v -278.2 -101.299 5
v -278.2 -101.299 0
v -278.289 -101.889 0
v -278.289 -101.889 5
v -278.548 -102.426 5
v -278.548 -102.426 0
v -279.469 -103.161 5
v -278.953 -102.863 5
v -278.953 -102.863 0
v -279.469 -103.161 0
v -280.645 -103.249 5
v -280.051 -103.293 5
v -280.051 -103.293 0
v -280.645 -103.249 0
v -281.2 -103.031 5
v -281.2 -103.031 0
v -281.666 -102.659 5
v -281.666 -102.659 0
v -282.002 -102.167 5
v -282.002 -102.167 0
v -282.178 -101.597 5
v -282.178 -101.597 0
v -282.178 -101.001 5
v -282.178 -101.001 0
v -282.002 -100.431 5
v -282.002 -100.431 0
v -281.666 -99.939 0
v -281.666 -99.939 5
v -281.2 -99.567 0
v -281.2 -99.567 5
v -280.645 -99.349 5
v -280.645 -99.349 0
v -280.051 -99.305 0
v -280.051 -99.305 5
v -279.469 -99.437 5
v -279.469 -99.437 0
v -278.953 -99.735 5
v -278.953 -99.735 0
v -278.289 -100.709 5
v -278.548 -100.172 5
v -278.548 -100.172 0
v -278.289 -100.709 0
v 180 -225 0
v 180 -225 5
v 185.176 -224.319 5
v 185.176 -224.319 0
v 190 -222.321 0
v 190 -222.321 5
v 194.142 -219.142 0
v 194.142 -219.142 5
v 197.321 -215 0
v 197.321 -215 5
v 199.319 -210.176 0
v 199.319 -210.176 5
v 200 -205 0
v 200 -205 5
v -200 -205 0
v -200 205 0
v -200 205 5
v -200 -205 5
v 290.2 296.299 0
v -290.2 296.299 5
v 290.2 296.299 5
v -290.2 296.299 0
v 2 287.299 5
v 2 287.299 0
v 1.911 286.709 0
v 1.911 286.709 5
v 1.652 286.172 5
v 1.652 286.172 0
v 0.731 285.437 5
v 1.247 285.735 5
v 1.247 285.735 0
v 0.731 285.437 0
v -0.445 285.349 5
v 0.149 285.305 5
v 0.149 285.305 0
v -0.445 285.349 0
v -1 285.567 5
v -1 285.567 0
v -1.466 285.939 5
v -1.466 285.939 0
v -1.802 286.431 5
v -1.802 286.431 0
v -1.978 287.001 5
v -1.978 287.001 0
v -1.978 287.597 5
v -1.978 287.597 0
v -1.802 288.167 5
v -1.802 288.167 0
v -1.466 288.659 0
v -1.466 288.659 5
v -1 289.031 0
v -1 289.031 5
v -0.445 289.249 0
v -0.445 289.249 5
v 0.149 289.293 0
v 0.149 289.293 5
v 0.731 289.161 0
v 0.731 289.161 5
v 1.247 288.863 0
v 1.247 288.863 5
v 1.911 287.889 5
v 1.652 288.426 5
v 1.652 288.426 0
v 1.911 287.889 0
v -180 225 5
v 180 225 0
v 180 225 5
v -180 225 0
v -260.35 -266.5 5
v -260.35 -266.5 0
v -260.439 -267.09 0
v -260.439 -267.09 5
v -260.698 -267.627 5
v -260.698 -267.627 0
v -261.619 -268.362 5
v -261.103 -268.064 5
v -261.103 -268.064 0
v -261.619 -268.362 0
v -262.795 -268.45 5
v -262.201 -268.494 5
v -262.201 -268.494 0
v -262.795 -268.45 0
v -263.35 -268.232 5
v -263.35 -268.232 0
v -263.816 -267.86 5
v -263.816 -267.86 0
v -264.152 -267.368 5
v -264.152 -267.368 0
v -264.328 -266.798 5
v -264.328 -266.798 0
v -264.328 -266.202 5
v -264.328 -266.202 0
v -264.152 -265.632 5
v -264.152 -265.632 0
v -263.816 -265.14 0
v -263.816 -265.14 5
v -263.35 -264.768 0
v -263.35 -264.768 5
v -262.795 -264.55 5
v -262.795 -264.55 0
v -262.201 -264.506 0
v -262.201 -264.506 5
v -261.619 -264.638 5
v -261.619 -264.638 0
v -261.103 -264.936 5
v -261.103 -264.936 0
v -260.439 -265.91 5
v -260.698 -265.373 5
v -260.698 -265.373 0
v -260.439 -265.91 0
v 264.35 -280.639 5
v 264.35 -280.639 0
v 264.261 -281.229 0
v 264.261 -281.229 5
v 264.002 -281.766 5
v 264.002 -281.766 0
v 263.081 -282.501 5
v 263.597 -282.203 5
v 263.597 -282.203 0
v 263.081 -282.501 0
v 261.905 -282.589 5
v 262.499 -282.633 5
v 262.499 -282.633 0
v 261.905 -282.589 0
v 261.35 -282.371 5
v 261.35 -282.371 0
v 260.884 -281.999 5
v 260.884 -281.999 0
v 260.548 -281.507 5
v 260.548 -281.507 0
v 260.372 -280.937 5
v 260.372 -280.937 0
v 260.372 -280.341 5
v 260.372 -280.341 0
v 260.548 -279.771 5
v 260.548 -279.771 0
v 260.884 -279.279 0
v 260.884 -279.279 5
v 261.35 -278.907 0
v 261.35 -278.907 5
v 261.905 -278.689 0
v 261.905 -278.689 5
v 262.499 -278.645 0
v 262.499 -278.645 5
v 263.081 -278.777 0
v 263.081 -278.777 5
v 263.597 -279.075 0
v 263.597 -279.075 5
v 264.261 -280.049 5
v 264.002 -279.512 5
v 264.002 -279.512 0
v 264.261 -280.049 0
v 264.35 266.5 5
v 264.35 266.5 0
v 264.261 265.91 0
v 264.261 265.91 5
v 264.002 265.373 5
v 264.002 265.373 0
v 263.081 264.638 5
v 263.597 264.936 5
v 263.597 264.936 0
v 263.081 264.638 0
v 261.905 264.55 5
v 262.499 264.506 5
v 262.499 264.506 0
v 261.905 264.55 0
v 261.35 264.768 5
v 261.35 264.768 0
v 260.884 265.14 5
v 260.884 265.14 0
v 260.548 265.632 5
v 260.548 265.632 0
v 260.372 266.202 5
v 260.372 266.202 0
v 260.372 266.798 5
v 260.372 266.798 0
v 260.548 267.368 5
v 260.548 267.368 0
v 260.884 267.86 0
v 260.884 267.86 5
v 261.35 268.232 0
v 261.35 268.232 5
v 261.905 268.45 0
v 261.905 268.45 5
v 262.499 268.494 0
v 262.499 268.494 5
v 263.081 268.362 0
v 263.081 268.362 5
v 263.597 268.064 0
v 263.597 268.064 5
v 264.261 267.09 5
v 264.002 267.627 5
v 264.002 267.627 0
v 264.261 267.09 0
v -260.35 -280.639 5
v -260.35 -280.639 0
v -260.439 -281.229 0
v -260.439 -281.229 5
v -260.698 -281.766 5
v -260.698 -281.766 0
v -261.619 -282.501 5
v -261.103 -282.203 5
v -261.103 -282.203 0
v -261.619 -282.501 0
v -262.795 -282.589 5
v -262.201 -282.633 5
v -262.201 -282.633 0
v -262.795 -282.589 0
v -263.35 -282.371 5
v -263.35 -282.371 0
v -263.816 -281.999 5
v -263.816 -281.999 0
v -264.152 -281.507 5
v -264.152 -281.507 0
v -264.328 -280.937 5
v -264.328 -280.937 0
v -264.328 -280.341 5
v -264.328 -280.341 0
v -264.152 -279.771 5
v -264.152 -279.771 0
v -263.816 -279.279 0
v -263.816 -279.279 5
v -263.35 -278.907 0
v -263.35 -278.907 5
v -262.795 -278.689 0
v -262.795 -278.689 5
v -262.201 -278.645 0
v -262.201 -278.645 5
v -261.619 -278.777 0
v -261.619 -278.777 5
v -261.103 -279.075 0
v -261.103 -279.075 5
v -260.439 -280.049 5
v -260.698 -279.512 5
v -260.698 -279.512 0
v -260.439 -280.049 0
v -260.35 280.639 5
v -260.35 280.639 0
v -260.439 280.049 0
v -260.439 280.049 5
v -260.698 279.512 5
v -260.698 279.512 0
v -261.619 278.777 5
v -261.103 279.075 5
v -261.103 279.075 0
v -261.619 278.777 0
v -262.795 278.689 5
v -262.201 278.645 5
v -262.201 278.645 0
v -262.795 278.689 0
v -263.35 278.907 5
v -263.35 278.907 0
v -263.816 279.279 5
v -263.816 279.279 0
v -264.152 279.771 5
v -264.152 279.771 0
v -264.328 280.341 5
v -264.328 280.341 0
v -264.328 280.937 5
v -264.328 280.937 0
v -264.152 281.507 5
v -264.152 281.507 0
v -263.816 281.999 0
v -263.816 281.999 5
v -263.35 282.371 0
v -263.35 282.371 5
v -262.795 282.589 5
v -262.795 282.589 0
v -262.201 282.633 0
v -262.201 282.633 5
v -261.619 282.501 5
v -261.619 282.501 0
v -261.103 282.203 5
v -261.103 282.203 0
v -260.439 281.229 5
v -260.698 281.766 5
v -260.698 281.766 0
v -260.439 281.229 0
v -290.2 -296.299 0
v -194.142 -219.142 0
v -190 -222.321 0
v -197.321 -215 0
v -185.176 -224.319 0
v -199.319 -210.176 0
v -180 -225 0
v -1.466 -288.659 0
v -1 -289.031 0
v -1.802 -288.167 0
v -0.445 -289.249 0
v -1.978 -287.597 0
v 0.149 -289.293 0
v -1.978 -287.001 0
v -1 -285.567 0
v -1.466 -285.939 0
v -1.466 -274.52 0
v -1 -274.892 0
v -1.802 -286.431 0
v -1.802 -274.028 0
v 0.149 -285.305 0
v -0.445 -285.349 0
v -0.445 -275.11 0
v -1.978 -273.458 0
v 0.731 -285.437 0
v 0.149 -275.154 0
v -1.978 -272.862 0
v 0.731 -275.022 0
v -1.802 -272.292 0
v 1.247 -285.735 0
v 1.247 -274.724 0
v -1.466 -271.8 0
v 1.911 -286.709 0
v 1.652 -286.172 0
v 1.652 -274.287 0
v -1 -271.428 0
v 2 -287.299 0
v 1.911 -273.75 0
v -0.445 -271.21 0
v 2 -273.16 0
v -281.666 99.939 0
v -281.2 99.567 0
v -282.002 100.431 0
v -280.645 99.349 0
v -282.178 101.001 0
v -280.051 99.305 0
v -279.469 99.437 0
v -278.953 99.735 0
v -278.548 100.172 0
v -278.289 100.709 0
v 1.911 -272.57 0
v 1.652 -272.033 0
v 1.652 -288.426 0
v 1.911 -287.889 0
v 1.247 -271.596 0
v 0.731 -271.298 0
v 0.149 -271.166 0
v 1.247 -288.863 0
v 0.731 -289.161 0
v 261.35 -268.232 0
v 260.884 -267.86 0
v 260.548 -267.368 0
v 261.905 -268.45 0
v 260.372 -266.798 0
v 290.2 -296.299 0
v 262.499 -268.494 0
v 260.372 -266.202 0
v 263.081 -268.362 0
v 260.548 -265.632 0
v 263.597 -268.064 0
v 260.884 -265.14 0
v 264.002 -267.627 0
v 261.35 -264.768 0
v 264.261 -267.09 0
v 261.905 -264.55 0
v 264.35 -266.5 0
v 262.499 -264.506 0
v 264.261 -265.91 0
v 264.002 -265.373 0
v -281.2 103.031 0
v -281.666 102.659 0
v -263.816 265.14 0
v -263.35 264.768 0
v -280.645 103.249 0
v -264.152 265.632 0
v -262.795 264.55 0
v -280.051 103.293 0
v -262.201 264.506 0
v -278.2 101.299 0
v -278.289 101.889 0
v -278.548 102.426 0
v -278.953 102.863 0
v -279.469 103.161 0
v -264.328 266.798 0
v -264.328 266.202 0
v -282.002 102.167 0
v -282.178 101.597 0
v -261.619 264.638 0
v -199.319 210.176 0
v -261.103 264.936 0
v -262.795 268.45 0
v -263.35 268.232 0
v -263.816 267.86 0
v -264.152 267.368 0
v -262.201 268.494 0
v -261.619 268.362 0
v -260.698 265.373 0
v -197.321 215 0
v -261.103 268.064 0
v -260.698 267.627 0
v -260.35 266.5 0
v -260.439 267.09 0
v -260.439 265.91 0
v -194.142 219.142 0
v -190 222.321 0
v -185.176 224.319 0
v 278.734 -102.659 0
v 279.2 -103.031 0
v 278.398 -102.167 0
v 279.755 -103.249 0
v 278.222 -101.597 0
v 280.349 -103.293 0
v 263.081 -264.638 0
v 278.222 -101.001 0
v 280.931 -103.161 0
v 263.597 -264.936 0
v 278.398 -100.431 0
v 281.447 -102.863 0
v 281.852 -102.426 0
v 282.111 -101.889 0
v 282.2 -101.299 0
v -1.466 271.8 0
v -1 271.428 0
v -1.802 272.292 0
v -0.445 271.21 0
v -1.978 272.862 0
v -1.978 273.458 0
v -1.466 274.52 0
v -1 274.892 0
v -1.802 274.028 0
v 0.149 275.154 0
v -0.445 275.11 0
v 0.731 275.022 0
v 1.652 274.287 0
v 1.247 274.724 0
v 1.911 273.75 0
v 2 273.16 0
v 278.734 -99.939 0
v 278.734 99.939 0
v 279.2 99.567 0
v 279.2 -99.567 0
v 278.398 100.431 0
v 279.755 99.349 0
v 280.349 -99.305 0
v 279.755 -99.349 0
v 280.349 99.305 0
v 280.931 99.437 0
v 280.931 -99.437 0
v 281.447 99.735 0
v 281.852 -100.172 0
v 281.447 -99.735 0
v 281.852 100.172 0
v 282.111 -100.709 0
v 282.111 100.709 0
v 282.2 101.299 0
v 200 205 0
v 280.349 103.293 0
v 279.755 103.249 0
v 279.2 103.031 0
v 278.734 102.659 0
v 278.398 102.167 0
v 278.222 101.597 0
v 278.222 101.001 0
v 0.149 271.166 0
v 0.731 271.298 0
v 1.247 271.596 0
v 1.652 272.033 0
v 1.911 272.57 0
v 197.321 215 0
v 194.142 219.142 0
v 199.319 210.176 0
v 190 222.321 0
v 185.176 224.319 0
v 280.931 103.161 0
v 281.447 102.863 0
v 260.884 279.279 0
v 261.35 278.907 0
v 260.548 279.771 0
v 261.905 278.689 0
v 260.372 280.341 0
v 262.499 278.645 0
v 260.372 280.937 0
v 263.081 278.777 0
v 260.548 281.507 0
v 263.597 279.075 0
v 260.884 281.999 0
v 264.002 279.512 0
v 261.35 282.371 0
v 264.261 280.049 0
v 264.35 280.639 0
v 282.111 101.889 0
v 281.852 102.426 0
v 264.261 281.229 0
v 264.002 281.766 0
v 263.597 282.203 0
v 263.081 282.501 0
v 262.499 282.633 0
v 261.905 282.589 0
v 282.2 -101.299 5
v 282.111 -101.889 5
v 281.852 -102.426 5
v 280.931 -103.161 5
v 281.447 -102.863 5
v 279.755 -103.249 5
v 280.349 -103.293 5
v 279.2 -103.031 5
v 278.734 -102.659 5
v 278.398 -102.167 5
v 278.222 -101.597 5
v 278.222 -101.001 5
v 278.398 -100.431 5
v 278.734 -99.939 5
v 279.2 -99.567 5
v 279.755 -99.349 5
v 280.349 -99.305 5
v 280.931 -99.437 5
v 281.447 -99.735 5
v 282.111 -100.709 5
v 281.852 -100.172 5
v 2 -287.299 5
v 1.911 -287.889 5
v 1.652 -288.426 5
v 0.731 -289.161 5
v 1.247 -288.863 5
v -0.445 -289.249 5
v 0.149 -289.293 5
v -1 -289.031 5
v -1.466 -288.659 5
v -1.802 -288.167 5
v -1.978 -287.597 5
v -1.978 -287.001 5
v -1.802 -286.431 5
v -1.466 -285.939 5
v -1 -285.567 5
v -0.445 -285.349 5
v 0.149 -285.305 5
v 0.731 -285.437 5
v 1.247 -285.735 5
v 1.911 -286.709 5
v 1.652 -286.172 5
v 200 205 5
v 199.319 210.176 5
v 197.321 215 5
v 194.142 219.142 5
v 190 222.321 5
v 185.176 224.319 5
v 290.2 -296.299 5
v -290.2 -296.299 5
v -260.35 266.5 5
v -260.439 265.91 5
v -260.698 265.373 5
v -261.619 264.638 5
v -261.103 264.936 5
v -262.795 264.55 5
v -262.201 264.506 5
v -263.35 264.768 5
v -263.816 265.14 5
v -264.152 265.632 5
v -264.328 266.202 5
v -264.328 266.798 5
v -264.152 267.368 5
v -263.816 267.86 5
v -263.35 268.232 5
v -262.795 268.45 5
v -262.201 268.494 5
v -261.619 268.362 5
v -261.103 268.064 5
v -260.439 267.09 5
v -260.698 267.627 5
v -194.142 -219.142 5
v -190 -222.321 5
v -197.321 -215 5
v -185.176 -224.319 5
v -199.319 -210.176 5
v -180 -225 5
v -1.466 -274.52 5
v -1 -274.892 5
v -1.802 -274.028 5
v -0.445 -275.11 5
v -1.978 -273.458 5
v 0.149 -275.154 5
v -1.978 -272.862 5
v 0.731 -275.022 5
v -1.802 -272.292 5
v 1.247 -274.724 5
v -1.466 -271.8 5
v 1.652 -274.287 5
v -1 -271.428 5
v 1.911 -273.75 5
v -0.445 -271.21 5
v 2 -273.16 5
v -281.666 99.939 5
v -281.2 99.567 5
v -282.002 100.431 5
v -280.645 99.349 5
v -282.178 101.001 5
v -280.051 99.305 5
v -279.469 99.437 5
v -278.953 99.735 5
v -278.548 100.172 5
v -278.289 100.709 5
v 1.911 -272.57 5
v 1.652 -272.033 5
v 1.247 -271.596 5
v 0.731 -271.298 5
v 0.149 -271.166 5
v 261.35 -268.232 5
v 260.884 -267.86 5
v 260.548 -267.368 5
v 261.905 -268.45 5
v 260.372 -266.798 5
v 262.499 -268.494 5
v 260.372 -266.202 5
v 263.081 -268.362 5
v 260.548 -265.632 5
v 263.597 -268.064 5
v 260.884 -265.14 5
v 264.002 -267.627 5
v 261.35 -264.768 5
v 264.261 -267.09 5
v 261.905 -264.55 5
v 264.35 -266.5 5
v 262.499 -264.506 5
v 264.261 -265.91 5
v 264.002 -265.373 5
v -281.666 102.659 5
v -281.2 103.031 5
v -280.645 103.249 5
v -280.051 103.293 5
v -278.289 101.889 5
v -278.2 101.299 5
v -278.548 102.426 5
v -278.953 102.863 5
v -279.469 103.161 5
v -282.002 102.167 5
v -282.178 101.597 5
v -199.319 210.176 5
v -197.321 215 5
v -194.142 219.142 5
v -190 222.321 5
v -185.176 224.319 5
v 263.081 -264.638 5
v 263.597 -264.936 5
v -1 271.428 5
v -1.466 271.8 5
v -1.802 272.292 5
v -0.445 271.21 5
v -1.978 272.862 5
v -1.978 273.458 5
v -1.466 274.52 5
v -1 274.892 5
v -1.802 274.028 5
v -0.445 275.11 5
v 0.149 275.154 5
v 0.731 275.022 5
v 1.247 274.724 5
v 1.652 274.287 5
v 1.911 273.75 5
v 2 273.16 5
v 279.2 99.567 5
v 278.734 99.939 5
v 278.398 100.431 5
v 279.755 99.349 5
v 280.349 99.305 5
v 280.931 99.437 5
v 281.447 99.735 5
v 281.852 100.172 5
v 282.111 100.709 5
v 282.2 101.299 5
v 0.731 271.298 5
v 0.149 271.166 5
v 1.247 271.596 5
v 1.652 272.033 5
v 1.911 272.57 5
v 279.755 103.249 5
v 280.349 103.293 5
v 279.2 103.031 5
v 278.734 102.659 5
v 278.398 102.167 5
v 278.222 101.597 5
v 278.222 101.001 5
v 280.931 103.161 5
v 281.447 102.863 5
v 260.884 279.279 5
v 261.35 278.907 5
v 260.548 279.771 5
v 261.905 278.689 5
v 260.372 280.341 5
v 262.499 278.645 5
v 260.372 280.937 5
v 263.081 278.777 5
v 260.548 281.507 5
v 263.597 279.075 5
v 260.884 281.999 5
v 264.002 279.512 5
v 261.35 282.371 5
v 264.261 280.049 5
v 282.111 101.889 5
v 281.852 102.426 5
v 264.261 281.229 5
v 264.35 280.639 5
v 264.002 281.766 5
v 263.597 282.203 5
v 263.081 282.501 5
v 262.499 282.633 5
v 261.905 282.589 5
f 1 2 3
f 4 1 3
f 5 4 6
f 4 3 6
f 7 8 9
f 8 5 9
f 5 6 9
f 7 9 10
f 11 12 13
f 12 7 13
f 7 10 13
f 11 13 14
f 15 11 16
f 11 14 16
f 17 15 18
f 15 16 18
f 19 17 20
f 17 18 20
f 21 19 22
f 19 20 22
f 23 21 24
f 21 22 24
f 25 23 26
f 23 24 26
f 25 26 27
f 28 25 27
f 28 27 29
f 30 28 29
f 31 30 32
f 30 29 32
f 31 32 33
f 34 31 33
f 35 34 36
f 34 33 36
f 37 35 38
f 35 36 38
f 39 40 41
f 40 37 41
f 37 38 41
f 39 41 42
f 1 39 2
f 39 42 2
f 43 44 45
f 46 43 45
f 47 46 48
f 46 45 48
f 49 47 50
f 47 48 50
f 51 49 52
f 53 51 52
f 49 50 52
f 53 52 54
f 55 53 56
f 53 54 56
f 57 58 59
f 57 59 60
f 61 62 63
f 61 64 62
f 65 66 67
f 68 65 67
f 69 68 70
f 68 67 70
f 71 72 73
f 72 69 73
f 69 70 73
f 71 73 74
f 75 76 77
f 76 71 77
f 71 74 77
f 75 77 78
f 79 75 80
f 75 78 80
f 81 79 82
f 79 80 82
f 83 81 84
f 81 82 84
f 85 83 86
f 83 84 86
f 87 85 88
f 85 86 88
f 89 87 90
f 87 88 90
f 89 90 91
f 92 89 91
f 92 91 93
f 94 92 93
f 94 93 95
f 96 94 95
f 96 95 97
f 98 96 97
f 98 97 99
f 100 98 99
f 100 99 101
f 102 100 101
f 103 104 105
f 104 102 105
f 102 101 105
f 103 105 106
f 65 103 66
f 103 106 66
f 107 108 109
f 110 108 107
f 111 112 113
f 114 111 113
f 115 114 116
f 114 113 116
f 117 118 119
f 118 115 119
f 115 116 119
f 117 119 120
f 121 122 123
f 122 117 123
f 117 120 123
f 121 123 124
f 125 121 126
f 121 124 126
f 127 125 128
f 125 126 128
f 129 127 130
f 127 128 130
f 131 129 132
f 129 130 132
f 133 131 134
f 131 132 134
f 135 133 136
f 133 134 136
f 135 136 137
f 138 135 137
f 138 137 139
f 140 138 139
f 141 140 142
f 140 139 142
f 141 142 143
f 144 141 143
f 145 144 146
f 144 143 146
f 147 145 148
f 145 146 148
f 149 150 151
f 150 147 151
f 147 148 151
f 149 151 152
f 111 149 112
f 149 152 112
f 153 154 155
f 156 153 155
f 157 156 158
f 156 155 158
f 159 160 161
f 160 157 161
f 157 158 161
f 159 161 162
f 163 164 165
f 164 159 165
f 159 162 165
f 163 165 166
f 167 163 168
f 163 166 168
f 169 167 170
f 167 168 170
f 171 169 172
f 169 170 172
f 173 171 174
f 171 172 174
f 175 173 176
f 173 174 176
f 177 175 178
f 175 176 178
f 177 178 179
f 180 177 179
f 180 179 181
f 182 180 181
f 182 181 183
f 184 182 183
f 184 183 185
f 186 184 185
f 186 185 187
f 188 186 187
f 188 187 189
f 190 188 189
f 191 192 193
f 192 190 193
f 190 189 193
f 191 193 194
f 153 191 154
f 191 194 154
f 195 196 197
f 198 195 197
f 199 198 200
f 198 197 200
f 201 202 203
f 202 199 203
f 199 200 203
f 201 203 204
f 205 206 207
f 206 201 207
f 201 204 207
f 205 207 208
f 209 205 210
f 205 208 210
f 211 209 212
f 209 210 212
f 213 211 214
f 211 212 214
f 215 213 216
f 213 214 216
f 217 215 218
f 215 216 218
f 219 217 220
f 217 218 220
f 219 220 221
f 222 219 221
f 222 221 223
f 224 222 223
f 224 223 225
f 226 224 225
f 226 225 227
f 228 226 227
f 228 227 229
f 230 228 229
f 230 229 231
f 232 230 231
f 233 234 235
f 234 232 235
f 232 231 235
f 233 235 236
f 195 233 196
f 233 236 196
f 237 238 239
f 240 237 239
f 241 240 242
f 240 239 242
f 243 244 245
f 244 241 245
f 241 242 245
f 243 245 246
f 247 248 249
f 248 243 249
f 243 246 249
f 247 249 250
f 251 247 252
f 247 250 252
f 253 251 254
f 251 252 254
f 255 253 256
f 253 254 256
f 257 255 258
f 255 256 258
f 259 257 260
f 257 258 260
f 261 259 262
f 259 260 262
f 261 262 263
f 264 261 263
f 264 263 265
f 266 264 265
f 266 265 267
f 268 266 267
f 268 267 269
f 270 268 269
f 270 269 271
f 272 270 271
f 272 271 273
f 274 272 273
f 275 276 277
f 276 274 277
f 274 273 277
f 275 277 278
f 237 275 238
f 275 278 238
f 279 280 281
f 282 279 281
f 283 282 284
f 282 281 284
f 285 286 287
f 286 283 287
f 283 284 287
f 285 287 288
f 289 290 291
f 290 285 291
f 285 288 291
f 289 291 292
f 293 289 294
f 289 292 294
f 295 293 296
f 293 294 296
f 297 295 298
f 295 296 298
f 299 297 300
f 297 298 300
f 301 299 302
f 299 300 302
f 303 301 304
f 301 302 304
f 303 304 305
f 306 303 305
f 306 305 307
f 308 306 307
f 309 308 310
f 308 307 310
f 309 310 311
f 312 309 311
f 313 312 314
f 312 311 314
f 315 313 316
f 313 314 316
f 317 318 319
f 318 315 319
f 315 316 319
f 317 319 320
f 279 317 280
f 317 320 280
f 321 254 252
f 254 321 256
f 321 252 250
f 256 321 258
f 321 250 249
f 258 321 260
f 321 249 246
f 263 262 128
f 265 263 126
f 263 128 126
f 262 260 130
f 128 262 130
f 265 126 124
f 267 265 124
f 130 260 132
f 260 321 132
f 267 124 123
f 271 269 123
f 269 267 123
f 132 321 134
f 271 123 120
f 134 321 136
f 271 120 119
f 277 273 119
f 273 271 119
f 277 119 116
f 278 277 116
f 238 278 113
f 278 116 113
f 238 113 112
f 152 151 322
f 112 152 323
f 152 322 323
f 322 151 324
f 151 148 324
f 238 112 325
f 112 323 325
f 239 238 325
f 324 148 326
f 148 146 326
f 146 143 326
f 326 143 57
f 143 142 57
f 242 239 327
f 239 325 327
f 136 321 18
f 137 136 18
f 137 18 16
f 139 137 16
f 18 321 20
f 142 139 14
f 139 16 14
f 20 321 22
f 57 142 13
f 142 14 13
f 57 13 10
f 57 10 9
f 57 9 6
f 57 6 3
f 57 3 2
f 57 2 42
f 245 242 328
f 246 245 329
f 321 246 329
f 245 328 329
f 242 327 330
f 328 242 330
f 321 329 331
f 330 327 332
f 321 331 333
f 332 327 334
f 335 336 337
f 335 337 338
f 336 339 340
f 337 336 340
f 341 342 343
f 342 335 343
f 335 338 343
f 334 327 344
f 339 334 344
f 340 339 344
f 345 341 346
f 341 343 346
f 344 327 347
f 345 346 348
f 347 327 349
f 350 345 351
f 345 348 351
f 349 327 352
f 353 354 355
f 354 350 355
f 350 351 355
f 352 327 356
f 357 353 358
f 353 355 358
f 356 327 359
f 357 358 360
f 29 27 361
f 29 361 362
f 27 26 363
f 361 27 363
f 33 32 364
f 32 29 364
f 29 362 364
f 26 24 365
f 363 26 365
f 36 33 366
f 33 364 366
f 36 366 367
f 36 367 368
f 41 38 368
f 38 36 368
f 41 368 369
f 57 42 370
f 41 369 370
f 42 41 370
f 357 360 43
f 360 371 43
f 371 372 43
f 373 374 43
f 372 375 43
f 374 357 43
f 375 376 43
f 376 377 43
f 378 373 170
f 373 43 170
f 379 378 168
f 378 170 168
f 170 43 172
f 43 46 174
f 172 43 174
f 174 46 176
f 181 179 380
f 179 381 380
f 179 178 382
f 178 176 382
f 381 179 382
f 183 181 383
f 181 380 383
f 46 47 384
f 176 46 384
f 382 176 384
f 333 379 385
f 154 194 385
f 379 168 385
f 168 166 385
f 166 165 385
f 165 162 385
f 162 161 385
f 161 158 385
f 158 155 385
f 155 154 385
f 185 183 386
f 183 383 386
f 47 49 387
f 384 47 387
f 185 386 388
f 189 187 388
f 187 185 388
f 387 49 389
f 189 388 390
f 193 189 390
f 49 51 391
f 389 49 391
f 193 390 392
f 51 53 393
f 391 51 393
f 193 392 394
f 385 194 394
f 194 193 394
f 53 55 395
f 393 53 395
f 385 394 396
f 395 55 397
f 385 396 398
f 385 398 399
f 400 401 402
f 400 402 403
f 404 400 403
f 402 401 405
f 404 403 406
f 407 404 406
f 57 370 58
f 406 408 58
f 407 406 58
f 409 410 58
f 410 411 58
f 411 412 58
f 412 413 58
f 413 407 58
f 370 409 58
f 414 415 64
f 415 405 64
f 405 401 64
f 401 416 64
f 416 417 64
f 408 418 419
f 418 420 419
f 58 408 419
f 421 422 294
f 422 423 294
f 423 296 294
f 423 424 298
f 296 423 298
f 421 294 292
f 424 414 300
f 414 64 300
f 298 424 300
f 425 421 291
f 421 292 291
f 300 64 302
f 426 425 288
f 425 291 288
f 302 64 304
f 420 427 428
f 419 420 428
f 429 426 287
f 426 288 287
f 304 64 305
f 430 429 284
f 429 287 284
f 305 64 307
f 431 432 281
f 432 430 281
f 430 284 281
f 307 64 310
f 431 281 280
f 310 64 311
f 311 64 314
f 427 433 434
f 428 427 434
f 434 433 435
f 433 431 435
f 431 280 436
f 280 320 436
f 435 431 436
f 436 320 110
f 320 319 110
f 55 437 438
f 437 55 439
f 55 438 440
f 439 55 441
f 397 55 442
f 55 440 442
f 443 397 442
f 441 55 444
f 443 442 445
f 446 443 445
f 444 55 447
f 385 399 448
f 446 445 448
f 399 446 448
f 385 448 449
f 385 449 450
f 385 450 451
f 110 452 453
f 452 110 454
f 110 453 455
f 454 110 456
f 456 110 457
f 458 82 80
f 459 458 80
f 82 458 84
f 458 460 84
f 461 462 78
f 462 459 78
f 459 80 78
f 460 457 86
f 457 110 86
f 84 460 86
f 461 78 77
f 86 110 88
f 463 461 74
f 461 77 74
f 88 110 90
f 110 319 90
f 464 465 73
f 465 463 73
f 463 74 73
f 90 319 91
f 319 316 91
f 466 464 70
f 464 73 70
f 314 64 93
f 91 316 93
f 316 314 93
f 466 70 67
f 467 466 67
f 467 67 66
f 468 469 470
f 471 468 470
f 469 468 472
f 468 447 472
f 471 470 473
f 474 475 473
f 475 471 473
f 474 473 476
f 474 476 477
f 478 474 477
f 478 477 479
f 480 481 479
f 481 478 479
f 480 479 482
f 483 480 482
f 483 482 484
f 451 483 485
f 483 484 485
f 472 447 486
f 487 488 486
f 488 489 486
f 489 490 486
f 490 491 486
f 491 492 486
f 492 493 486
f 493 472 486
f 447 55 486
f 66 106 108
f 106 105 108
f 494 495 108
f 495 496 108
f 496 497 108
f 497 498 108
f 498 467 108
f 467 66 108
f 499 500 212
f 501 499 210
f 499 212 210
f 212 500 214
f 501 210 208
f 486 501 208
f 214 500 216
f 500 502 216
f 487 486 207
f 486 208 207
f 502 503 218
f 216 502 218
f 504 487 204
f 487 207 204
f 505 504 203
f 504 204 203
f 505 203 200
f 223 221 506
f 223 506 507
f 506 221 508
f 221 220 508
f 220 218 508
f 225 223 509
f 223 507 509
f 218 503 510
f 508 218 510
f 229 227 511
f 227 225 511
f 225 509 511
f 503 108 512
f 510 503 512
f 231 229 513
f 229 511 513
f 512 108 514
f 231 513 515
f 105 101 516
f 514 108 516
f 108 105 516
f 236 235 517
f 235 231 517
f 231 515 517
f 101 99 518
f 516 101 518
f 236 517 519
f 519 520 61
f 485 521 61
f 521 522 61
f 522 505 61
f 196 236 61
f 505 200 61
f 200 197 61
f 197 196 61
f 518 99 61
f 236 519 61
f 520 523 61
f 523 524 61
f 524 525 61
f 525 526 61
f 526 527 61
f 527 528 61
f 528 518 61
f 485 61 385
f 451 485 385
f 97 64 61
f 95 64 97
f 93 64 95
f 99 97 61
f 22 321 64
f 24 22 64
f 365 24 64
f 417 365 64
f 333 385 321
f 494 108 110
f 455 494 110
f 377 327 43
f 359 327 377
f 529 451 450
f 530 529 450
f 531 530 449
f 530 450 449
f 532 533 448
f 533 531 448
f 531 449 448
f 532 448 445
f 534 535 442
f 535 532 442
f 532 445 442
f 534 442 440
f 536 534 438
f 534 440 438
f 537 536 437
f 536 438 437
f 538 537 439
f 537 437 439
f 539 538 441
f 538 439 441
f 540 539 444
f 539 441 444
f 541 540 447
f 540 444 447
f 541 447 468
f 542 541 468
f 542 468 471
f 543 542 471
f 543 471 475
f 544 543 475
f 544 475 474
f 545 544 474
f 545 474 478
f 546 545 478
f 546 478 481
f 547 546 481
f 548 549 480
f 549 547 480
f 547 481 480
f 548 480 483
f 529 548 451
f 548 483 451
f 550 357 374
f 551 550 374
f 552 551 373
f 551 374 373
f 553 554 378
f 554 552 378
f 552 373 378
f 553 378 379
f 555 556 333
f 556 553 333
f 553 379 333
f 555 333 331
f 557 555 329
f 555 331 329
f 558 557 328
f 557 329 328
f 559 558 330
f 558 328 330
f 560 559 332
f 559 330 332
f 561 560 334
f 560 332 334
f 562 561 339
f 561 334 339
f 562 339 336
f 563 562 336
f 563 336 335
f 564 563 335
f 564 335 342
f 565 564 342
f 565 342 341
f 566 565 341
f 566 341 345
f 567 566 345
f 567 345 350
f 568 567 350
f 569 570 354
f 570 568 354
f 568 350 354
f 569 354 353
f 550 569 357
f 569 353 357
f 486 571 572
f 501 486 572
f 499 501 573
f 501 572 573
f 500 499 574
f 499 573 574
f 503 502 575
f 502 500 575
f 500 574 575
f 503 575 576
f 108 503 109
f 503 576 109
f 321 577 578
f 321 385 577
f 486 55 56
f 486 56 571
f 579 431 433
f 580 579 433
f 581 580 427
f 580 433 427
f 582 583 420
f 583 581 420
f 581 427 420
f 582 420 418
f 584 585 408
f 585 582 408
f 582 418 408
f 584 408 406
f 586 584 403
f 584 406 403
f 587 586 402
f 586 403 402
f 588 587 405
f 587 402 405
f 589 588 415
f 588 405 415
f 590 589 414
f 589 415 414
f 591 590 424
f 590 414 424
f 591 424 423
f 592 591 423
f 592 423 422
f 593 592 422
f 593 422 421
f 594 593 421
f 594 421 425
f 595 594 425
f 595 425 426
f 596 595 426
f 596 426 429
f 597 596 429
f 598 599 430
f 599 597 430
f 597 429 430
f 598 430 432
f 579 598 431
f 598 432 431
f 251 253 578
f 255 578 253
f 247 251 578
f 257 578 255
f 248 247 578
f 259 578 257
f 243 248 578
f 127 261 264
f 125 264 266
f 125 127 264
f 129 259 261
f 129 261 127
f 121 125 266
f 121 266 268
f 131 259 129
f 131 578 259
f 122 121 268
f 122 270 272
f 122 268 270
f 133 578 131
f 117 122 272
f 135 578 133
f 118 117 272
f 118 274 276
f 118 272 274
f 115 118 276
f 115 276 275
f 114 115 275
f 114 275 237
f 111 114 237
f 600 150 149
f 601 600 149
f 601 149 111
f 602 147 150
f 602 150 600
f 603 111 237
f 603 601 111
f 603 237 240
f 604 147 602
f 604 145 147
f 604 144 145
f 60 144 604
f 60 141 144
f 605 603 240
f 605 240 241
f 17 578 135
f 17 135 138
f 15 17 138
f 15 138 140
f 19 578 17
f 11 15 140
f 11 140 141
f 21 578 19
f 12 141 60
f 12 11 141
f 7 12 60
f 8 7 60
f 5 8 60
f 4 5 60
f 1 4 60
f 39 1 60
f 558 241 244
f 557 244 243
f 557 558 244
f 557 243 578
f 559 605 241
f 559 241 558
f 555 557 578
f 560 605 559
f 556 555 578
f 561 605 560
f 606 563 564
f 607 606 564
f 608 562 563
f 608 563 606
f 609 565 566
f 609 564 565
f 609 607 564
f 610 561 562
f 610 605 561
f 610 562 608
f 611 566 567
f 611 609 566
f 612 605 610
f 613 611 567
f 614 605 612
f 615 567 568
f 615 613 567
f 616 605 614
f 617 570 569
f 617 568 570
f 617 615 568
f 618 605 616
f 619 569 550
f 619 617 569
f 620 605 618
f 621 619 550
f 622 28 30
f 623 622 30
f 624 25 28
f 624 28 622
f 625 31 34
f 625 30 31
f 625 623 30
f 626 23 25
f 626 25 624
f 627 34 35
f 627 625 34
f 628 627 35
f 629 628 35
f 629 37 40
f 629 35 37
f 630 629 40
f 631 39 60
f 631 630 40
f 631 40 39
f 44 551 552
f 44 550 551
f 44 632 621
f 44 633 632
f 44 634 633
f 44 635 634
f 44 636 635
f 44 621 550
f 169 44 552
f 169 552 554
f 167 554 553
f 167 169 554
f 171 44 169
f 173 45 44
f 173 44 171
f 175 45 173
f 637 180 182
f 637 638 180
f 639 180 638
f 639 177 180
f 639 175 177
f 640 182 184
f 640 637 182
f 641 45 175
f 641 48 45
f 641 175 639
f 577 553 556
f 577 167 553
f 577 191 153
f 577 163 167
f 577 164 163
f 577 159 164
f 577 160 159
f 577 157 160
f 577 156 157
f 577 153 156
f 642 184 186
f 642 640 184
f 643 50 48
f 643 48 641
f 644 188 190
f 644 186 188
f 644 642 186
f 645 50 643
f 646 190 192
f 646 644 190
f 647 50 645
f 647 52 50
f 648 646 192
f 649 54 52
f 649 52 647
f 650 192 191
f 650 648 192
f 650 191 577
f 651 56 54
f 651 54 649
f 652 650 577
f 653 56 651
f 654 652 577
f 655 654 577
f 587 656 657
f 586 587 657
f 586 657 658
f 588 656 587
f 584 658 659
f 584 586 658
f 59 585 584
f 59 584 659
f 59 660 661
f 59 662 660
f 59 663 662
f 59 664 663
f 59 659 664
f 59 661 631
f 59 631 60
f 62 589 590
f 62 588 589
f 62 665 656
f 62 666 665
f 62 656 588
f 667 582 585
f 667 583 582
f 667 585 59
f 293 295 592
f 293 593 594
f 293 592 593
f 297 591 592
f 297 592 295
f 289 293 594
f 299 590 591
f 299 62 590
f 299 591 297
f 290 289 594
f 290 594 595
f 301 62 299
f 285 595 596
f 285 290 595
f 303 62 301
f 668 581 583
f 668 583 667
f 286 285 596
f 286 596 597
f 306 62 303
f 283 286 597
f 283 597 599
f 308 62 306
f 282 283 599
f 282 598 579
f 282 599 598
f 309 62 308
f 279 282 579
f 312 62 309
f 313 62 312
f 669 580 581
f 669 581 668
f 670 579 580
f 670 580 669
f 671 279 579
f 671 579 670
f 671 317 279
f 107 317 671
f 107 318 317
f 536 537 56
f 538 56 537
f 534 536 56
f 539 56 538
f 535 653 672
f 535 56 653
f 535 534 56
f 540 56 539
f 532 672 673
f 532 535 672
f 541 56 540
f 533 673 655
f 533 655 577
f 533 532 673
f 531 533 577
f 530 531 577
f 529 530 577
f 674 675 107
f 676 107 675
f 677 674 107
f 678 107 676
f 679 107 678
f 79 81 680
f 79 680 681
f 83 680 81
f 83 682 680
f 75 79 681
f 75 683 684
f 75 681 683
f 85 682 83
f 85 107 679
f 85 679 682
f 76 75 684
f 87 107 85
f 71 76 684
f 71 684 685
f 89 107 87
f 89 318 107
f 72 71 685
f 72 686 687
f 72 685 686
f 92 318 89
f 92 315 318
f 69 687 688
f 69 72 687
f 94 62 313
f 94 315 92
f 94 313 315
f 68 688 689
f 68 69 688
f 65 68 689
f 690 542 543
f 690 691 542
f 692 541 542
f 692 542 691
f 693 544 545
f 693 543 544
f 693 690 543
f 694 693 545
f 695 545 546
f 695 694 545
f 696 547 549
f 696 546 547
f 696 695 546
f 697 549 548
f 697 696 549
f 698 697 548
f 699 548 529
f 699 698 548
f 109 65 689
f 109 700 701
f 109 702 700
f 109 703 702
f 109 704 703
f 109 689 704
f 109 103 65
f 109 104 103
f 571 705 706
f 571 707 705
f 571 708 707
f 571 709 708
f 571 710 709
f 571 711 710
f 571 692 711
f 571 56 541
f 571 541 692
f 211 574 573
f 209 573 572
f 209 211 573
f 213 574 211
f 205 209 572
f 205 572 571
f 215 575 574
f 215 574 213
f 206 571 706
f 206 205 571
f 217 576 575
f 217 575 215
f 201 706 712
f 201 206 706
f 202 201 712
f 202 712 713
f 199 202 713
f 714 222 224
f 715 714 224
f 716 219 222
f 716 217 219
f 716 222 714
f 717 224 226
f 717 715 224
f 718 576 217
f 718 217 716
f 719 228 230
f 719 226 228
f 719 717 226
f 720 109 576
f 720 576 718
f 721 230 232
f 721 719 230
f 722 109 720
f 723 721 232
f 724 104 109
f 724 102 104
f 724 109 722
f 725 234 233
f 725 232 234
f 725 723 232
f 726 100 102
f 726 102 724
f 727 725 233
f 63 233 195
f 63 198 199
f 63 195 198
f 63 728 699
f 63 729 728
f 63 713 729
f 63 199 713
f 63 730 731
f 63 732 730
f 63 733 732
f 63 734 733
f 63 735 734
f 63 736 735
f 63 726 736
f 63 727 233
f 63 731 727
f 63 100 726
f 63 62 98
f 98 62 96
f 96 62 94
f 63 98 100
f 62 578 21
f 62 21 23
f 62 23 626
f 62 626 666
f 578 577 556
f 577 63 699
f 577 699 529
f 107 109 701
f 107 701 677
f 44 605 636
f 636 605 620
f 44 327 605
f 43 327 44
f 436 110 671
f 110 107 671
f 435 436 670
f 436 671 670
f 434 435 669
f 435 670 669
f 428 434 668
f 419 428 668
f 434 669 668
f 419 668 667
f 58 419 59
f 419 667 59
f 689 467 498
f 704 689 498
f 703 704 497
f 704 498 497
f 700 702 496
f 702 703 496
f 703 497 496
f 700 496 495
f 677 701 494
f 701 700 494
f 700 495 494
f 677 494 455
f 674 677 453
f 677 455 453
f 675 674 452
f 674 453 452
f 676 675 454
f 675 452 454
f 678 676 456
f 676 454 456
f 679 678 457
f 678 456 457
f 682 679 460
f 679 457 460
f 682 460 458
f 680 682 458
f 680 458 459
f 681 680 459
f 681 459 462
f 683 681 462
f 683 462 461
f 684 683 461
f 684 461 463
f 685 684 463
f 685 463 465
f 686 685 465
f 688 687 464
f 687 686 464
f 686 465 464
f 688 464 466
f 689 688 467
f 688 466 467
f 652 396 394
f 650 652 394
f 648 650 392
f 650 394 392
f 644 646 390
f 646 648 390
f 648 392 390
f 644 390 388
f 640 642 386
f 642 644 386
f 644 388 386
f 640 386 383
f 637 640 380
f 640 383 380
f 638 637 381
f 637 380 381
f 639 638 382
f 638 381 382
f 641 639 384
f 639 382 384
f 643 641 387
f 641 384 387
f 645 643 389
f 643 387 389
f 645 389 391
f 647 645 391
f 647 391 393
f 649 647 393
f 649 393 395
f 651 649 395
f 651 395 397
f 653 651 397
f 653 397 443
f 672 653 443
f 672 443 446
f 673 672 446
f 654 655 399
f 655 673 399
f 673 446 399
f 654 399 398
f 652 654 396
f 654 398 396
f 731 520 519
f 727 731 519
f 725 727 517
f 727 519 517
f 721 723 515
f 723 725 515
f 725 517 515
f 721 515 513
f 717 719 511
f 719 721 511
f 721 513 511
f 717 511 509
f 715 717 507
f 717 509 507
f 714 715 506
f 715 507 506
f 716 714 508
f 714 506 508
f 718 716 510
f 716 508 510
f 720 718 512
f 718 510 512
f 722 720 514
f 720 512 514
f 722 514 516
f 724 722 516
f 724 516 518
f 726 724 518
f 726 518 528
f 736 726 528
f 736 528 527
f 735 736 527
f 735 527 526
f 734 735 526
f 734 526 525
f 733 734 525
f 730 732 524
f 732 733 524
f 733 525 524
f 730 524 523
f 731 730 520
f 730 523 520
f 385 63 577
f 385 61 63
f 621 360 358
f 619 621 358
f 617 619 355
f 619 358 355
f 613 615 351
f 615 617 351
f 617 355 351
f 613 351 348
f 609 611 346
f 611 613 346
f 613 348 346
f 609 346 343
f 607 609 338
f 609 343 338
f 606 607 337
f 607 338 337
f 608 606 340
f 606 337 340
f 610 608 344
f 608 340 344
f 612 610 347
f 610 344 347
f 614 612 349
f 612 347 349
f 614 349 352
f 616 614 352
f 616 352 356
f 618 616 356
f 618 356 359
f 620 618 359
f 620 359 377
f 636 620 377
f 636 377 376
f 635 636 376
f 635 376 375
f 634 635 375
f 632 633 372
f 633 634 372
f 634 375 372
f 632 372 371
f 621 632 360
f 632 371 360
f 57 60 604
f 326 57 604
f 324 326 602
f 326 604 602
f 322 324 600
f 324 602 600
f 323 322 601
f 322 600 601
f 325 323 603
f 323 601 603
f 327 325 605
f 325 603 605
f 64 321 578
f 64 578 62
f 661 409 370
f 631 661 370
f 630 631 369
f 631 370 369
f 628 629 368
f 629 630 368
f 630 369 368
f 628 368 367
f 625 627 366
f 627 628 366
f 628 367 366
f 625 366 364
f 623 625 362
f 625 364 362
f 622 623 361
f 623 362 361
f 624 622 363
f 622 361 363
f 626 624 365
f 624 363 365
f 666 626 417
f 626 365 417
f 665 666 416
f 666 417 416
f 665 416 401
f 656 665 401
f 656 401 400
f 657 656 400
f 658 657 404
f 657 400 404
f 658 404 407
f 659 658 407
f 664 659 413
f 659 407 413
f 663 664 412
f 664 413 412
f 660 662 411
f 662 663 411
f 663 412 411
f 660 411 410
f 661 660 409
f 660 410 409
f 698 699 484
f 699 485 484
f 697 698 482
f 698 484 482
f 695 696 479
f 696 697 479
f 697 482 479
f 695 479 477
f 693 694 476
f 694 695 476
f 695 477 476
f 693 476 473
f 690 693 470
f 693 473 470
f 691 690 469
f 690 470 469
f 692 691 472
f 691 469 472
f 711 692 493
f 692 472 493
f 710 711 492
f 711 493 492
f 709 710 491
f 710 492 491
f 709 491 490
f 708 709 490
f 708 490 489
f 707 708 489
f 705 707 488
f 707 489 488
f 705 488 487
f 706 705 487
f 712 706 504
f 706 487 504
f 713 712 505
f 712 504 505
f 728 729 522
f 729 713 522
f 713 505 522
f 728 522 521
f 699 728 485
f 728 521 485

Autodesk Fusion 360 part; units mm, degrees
sketch "Sketch1" plane through (0, 0, 0) normal (0, 0, 1) x (1, 0, 0)
  line L0 (285.2, -291.299) -> (-285.2, -291.299)
  line L1 (-285.2, -291.299) -> (-285.2, 291.299)
  line L2 (-285.2, 291.299) -> (285.2, 291.299)
  line L3 (285.2, 291.299) -> (285.2, -291.299)
  line L4 (285.2, -291.299) -> (-285.2, 291.299) construction
  line L5 (-285.2, -291.299) -> (285.2, 291.299) construction
  line L6 (-262.35, 291.299) -> (-262.35, -291.299) construction
  circle A0 centre (-262.35, 280.639) radius 2
  circle A1 centre (-262.35, 266.5) radius 2
  circle A2 centre (-262.35, -280.639) radius 2
  circle A3 centre (-262.35, -266.5) radius 2
  line L7 (262.35, 291.299) -> (262.35, -291.299) construction
  circle A4 centre (262.35, 280.639) radius 2
  circle A5 centre (262.35, 266.5) radius 2
  circle A6 centre (262.35, -280.639) radius 2
  circle A7 centre (262.35, -266.5) radius 2
  line L8 (-262.35, -266.5) -> (262.35, -266.5) construction
  circle A8 centre (0, -273.16) radius 2
  line L9 (0, -291.299) -> (0, 291.299) construction
  circle A9 centre (0, 273.16) radius 2
  circle A10 centre (0, 287.299) radius 2
  circle A11 centre (0, -287.299) radius 2
  line L10 (200, 225) -> (-200, 225)
  line L11 (-200, 225) -> (-200, -225)
  line L12 (-200, -225) -> (200, -225)
  line L13 (200, -225) -> (200, 225)
  line L14 (200, 225) -> (-200, -225) construction
  line L15 (-200, 225) -> (200, -225) construction
  line L16 (-290.2, 296.299) -> (290.2, 296.299)
  line L17 (290.2, 296.299) -> (290.2, -296.299)
  line L18 (290.2, -296.299) -> (-290.2, -296.299)
  line L19 (-290.2, -296.299) -> (-290.2, 296.299)
  circle A12 centre (280.2, 101.299) radius 2
  circle A13 centre (280.2, -101.299) radius 2
  circle A14 centre (-280.2, -101.299) radius 2
  circle A15 centre (-280.2, 101.299) radius 2
  line L20 (-304.8, -372.499) -> (304.8, -372.499) construction
  line L21 (304.8, -372.499) -> (304.8, 541.901) construction
  line L22 (304.8, 541.901) -> (-304.8, 541.901) construction
  line L23 (-304.8, 541.901) -> (-304.8, -372.499) construction
  line L24 (0, -372.499) -> (0, -296.299) construction
  line L25 (-262.35, 266.5) -> (262.35, 266.5) construction
  line L26 (262.35, -280.639) -> (-262.35, -280.639) construction
  line L27 (262.35, 280.639) -> (-262.35, 280.639) construction
  dimension "d1" = 570.4
  dimension "d2" = 582.598
  dimension "d3" = 22.85
  dimension "d4" = 4
  dimension "d6" = 4
  dimension "d8" = 4
  dimension "d9" = 4
  dimension "d12" = 22.85
  dimension "d13" = 4
  dimension "d14" = 4
  dimension "d17" = 4
  dimension "d18" = 4
  dimension "d21" = 4
  dimension "d22" = 4
  dimension "d23" = 4
  dimension "d24" = 4
  dimension "d28" = 450
  dimension "d29" = 400
  dimension "d30" = 5
  dimension "d31" = 5
  dimension "d32" = 5
  dimension "d33" = 5
  dimension "d37" = 4
  dimension "d38" = 4
  dimension "d39" = 4
  dimension "d40" = 4
  dimension "d41" = 190
  dimension "d42" = 190
  dimension "d43" = 5
  dimension "d44" = 5
  dimension "d45" = 190
  dimension "d46" = 190
  dimension "d47" = 5
  dimension "d49" = 5
  dimension "d51" = 609.6
  dimension "d52" = 76.2
  dimension "d53" = 914.4
  dimension "d54" = 24.799
  dimension "d55" = 24.799
  dimension "d56" = 10.66
  dimension "d57" = 10.66
  dimension "d61" = 4
  dimension "d62" = 14.139
  dimension "d63" = 14.139
  dimension "d64" = 4
extrude "Extrude1" add sketch "Sketch1" along normal blind 5 contours L0 L1 L2 L3 | L16 L17 L18 L19 makes body 1
fillet "Fillet1" radius 20 4 edges at (-200, -225, 2.5) (200, -225, 2.5) (200, 225, 2.5) (-200, 225, 2.5) on bodies 1
copy_body "Body->Comp1" bodies 1 removing the originals makes body 2 in component "Front Panel"
component "Front Panel" placed x (1, 0, 0) y (0, 1, 0) z (0, 0, 1) at (0, 0, 0)
equation "d1 = XRailLength + 220.4 mm"
equation "d2 = PrintHeight + 282.598 mm"
equation "d28 = PrintHeight + 150 mm"
equation "d29 = XRailLength + 50 mm"
equation "d30 = WallThickness"
equation "d31 = WallThickness"
equation "d32 = WallThickness"
equation "d33 = WallThickness"
equation "WallThickness = 5 mm"
equation "XRailLength = 350 mm"
equation "PrintHeight = 300 mm"
